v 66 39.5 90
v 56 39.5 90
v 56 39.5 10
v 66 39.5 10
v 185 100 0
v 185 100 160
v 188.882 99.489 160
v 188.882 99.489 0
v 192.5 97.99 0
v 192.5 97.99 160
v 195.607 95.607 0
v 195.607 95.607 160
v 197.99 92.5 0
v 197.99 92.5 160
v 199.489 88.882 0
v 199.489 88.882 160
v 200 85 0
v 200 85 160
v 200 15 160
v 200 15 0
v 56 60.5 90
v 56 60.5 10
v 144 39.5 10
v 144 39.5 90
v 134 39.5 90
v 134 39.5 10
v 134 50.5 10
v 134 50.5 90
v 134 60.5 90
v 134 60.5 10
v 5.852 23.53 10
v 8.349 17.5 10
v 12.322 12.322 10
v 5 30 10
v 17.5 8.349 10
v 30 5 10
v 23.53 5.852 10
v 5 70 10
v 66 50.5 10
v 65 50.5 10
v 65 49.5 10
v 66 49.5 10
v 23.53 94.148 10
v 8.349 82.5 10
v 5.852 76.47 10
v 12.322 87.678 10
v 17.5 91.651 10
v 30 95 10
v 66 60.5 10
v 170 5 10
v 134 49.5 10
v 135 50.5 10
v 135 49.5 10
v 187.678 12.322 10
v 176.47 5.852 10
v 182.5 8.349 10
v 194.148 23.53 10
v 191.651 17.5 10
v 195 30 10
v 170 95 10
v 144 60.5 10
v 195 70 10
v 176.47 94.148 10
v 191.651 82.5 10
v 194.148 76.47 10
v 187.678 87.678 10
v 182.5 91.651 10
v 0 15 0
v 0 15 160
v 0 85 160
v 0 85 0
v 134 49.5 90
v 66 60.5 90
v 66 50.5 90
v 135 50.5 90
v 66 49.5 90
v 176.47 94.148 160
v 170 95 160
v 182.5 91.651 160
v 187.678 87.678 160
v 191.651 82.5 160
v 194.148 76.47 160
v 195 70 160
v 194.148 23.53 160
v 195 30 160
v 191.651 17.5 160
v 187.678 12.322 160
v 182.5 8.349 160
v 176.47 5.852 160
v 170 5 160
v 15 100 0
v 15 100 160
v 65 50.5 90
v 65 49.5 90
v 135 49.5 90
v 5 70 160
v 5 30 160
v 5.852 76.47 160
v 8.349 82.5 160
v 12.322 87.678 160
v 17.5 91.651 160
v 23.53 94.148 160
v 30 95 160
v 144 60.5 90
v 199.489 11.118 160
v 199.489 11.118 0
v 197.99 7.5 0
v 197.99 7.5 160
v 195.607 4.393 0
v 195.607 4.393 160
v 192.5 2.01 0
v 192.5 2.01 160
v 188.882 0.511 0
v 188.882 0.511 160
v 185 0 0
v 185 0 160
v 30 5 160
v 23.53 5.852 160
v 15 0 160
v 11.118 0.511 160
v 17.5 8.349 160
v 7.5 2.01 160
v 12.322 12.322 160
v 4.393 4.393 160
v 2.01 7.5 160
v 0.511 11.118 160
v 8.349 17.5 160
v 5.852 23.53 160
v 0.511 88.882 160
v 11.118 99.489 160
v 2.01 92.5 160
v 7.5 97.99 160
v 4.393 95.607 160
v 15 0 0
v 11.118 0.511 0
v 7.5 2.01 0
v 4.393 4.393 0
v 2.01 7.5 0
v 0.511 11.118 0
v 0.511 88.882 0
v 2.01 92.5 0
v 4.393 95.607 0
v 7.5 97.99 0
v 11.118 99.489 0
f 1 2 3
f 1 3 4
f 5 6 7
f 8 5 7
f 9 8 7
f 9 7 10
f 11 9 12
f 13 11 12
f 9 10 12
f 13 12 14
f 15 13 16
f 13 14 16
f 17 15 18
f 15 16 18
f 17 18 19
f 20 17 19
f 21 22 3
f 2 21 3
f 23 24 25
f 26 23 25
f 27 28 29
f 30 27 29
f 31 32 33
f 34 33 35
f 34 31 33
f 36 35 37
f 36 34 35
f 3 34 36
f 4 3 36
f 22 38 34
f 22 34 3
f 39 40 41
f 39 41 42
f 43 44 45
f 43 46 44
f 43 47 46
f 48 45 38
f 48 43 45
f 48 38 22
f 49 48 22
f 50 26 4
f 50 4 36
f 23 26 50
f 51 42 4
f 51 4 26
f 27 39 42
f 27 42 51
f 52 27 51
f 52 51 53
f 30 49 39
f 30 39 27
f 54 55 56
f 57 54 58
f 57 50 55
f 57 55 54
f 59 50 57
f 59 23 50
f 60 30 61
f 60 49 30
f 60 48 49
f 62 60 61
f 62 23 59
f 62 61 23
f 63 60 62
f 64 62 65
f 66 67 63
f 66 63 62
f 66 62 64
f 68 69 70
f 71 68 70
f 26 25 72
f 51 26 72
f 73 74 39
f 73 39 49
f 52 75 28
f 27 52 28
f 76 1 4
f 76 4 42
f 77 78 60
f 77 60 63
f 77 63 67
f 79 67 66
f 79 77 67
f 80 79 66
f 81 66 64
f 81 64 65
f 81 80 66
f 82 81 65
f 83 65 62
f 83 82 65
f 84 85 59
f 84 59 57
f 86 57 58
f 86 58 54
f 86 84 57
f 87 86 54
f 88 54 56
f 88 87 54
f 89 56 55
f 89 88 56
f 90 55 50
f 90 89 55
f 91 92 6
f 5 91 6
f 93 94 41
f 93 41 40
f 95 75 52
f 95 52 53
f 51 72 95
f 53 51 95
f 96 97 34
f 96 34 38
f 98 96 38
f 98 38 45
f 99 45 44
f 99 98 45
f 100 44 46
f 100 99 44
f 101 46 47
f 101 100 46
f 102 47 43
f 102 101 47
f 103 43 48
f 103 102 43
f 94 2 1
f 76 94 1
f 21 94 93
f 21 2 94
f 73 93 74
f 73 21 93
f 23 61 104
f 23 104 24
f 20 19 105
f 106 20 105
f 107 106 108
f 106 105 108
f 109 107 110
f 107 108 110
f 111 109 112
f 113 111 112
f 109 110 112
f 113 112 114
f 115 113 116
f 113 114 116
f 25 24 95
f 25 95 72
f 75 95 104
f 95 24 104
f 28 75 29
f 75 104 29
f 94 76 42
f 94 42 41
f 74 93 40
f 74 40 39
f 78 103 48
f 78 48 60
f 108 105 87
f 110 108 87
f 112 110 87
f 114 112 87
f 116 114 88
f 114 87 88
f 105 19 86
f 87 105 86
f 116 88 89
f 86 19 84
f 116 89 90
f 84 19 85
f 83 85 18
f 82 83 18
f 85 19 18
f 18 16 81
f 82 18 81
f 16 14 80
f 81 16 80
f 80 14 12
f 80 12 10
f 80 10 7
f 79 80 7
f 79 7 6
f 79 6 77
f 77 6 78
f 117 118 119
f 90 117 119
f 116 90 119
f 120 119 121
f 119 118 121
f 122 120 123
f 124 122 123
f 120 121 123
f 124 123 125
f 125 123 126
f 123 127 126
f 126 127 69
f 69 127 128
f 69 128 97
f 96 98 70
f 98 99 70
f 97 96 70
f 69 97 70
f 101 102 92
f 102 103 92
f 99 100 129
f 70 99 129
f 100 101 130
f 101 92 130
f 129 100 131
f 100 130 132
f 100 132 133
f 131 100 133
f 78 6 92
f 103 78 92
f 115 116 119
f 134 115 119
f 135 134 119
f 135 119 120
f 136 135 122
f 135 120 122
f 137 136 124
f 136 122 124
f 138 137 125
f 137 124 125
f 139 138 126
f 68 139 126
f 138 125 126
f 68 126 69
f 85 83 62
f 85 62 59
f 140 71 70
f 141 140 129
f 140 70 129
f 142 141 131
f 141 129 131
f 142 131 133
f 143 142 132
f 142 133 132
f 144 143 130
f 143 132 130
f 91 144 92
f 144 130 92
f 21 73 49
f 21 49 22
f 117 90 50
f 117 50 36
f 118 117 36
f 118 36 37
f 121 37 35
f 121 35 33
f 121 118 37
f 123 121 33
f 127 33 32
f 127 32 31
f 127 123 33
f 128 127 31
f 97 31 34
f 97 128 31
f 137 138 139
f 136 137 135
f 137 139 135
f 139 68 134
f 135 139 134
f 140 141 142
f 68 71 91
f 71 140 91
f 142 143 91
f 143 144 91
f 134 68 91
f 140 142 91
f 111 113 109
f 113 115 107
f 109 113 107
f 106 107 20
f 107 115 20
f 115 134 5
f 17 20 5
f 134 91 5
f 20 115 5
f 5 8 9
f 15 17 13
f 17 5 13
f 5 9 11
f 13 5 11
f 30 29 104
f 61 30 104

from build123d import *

# Parameters (mm, degrees)
SKETCH1_W           = 200
SKETCH1_H           = 100
BOSS_EXTRUDE1_DEPTH = 10
CUT_EXTRUDE1_DEPTH  = 10
BOSS_EXTRUDE2_START = 150
BOSS_EXTRUDE2_DEPTH = 150
BOSS_EXTRUDE3_DEPTH = 80


with BuildPart() as part:
    # Sketch1 → Boss-Extrude1 (new body)
    with BuildSketch(Plane.XY):
        with Locations((100, 50)):
            Rectangle(SKETCH1_W, SKETCH1_H)
    extrude(amount=BOSS_EXTRUDE1_DEPTH)

    # Sketch2 → Cut-Extrude1 (cut)
    with BuildSketch(Plane.XY.offset(10)):
        with BuildLine():
            ThreePointArc((0, 85), (4.393398282, 95.606601718), (15, 100))
            Line((15, 100), (0, 100))
            Line((0, 100), (0, 85))
        make_face()
        with BuildLine():
            Line((200, 100), (185, 100))
            ThreePointArc((185, 100), (195.606601718, 95.606601718), (200, 85))
            Line((200, 85), (200, 100))
        make_face()
        with BuildLine():
            Line((200, 0), (200, 15))
            ThreePointArc((200, 15), (195.606601718, 4.393398282), (185, 0))
            Line((185, 0), (200, 0))
        make_face()
        with BuildLine():
            ThreePointArc((15, 0), (4.393398282, 4.393398282), (0, 15))
            Line((0, 15), (0, 0))
            Line((0, 0), (15, 0))
        make_face()
    extrude(amount=-CUT_EXTRUDE1_DEPTH, mode=Mode.SUBTRACT)

    # Sketch3 → Boss-Extrude2 (add)
    with BuildSketch(Plane.XY.offset(10).offset(BOSS_EXTRUDE2_START)):
        with BuildLine():
            Line((100, 100), (185, 100))
            ThreePointArc((185, 100), (195.606601718, 95.606601718), (200, 85))
            Line((200, 85), (200, 15))
            ThreePointArc((200, 15), (195.606601718, 4.393398282), (185, 0))
            Line((185, 0), (15, 0))
            ThreePointArc((15, 0), (4.393398282, 4.393398282), (0, 15))
            Line((0, 15), (0, 85))
            ThreePointArc((0, 85), (4.393398282, 95.606601718), (15, 100))
            Line((15, 100), (100, 100))
        make_face()
        with BuildLine():
            Line((30, 95), (170, 95))
            ThreePointArc((170, 95), (187.67766953, 87.67766953), (195, 70))
            Line((195, 70), (195, 30))
            ThreePointArc((195, 30), (187.67766953, 12.32233047), (170, 5))
            Line((170, 5), (30, 5))
            ThreePointArc((30, 5), (12.32233047, 12.32233047), (5, 30))
            Line((5, 30), (5, 70))
            ThreePointArc((5, 70), (12.32233047, 87.67766953), (30, 95))
        make_face(mode=Mode.SUBTRACT)
    extrude(amount=-BOSS_EXTRUDE2_DEPTH)

    # Sketch4 → Boss-Extrude3 (add)
    with BuildSketch(Plane.XY.offset(10)):
        Polygon((66, 60.5), (56, 60.5), (56, 39.5), (66, 39.5), (66, 49.5), (65, 49.5), (65, 50), (65, 50.5), (66, 50.5), align=None)
        Polygon((144, 39.5), (134, 39.5), (134, 49.5), (135, 49.5), (135, 50), (135, 50.5), (134, 50.5), (134, 60.5), (144, 60.5), align=None)
    extrude(amount=BOSS_EXTRUDE3_DEPTH)


solid = part.part
